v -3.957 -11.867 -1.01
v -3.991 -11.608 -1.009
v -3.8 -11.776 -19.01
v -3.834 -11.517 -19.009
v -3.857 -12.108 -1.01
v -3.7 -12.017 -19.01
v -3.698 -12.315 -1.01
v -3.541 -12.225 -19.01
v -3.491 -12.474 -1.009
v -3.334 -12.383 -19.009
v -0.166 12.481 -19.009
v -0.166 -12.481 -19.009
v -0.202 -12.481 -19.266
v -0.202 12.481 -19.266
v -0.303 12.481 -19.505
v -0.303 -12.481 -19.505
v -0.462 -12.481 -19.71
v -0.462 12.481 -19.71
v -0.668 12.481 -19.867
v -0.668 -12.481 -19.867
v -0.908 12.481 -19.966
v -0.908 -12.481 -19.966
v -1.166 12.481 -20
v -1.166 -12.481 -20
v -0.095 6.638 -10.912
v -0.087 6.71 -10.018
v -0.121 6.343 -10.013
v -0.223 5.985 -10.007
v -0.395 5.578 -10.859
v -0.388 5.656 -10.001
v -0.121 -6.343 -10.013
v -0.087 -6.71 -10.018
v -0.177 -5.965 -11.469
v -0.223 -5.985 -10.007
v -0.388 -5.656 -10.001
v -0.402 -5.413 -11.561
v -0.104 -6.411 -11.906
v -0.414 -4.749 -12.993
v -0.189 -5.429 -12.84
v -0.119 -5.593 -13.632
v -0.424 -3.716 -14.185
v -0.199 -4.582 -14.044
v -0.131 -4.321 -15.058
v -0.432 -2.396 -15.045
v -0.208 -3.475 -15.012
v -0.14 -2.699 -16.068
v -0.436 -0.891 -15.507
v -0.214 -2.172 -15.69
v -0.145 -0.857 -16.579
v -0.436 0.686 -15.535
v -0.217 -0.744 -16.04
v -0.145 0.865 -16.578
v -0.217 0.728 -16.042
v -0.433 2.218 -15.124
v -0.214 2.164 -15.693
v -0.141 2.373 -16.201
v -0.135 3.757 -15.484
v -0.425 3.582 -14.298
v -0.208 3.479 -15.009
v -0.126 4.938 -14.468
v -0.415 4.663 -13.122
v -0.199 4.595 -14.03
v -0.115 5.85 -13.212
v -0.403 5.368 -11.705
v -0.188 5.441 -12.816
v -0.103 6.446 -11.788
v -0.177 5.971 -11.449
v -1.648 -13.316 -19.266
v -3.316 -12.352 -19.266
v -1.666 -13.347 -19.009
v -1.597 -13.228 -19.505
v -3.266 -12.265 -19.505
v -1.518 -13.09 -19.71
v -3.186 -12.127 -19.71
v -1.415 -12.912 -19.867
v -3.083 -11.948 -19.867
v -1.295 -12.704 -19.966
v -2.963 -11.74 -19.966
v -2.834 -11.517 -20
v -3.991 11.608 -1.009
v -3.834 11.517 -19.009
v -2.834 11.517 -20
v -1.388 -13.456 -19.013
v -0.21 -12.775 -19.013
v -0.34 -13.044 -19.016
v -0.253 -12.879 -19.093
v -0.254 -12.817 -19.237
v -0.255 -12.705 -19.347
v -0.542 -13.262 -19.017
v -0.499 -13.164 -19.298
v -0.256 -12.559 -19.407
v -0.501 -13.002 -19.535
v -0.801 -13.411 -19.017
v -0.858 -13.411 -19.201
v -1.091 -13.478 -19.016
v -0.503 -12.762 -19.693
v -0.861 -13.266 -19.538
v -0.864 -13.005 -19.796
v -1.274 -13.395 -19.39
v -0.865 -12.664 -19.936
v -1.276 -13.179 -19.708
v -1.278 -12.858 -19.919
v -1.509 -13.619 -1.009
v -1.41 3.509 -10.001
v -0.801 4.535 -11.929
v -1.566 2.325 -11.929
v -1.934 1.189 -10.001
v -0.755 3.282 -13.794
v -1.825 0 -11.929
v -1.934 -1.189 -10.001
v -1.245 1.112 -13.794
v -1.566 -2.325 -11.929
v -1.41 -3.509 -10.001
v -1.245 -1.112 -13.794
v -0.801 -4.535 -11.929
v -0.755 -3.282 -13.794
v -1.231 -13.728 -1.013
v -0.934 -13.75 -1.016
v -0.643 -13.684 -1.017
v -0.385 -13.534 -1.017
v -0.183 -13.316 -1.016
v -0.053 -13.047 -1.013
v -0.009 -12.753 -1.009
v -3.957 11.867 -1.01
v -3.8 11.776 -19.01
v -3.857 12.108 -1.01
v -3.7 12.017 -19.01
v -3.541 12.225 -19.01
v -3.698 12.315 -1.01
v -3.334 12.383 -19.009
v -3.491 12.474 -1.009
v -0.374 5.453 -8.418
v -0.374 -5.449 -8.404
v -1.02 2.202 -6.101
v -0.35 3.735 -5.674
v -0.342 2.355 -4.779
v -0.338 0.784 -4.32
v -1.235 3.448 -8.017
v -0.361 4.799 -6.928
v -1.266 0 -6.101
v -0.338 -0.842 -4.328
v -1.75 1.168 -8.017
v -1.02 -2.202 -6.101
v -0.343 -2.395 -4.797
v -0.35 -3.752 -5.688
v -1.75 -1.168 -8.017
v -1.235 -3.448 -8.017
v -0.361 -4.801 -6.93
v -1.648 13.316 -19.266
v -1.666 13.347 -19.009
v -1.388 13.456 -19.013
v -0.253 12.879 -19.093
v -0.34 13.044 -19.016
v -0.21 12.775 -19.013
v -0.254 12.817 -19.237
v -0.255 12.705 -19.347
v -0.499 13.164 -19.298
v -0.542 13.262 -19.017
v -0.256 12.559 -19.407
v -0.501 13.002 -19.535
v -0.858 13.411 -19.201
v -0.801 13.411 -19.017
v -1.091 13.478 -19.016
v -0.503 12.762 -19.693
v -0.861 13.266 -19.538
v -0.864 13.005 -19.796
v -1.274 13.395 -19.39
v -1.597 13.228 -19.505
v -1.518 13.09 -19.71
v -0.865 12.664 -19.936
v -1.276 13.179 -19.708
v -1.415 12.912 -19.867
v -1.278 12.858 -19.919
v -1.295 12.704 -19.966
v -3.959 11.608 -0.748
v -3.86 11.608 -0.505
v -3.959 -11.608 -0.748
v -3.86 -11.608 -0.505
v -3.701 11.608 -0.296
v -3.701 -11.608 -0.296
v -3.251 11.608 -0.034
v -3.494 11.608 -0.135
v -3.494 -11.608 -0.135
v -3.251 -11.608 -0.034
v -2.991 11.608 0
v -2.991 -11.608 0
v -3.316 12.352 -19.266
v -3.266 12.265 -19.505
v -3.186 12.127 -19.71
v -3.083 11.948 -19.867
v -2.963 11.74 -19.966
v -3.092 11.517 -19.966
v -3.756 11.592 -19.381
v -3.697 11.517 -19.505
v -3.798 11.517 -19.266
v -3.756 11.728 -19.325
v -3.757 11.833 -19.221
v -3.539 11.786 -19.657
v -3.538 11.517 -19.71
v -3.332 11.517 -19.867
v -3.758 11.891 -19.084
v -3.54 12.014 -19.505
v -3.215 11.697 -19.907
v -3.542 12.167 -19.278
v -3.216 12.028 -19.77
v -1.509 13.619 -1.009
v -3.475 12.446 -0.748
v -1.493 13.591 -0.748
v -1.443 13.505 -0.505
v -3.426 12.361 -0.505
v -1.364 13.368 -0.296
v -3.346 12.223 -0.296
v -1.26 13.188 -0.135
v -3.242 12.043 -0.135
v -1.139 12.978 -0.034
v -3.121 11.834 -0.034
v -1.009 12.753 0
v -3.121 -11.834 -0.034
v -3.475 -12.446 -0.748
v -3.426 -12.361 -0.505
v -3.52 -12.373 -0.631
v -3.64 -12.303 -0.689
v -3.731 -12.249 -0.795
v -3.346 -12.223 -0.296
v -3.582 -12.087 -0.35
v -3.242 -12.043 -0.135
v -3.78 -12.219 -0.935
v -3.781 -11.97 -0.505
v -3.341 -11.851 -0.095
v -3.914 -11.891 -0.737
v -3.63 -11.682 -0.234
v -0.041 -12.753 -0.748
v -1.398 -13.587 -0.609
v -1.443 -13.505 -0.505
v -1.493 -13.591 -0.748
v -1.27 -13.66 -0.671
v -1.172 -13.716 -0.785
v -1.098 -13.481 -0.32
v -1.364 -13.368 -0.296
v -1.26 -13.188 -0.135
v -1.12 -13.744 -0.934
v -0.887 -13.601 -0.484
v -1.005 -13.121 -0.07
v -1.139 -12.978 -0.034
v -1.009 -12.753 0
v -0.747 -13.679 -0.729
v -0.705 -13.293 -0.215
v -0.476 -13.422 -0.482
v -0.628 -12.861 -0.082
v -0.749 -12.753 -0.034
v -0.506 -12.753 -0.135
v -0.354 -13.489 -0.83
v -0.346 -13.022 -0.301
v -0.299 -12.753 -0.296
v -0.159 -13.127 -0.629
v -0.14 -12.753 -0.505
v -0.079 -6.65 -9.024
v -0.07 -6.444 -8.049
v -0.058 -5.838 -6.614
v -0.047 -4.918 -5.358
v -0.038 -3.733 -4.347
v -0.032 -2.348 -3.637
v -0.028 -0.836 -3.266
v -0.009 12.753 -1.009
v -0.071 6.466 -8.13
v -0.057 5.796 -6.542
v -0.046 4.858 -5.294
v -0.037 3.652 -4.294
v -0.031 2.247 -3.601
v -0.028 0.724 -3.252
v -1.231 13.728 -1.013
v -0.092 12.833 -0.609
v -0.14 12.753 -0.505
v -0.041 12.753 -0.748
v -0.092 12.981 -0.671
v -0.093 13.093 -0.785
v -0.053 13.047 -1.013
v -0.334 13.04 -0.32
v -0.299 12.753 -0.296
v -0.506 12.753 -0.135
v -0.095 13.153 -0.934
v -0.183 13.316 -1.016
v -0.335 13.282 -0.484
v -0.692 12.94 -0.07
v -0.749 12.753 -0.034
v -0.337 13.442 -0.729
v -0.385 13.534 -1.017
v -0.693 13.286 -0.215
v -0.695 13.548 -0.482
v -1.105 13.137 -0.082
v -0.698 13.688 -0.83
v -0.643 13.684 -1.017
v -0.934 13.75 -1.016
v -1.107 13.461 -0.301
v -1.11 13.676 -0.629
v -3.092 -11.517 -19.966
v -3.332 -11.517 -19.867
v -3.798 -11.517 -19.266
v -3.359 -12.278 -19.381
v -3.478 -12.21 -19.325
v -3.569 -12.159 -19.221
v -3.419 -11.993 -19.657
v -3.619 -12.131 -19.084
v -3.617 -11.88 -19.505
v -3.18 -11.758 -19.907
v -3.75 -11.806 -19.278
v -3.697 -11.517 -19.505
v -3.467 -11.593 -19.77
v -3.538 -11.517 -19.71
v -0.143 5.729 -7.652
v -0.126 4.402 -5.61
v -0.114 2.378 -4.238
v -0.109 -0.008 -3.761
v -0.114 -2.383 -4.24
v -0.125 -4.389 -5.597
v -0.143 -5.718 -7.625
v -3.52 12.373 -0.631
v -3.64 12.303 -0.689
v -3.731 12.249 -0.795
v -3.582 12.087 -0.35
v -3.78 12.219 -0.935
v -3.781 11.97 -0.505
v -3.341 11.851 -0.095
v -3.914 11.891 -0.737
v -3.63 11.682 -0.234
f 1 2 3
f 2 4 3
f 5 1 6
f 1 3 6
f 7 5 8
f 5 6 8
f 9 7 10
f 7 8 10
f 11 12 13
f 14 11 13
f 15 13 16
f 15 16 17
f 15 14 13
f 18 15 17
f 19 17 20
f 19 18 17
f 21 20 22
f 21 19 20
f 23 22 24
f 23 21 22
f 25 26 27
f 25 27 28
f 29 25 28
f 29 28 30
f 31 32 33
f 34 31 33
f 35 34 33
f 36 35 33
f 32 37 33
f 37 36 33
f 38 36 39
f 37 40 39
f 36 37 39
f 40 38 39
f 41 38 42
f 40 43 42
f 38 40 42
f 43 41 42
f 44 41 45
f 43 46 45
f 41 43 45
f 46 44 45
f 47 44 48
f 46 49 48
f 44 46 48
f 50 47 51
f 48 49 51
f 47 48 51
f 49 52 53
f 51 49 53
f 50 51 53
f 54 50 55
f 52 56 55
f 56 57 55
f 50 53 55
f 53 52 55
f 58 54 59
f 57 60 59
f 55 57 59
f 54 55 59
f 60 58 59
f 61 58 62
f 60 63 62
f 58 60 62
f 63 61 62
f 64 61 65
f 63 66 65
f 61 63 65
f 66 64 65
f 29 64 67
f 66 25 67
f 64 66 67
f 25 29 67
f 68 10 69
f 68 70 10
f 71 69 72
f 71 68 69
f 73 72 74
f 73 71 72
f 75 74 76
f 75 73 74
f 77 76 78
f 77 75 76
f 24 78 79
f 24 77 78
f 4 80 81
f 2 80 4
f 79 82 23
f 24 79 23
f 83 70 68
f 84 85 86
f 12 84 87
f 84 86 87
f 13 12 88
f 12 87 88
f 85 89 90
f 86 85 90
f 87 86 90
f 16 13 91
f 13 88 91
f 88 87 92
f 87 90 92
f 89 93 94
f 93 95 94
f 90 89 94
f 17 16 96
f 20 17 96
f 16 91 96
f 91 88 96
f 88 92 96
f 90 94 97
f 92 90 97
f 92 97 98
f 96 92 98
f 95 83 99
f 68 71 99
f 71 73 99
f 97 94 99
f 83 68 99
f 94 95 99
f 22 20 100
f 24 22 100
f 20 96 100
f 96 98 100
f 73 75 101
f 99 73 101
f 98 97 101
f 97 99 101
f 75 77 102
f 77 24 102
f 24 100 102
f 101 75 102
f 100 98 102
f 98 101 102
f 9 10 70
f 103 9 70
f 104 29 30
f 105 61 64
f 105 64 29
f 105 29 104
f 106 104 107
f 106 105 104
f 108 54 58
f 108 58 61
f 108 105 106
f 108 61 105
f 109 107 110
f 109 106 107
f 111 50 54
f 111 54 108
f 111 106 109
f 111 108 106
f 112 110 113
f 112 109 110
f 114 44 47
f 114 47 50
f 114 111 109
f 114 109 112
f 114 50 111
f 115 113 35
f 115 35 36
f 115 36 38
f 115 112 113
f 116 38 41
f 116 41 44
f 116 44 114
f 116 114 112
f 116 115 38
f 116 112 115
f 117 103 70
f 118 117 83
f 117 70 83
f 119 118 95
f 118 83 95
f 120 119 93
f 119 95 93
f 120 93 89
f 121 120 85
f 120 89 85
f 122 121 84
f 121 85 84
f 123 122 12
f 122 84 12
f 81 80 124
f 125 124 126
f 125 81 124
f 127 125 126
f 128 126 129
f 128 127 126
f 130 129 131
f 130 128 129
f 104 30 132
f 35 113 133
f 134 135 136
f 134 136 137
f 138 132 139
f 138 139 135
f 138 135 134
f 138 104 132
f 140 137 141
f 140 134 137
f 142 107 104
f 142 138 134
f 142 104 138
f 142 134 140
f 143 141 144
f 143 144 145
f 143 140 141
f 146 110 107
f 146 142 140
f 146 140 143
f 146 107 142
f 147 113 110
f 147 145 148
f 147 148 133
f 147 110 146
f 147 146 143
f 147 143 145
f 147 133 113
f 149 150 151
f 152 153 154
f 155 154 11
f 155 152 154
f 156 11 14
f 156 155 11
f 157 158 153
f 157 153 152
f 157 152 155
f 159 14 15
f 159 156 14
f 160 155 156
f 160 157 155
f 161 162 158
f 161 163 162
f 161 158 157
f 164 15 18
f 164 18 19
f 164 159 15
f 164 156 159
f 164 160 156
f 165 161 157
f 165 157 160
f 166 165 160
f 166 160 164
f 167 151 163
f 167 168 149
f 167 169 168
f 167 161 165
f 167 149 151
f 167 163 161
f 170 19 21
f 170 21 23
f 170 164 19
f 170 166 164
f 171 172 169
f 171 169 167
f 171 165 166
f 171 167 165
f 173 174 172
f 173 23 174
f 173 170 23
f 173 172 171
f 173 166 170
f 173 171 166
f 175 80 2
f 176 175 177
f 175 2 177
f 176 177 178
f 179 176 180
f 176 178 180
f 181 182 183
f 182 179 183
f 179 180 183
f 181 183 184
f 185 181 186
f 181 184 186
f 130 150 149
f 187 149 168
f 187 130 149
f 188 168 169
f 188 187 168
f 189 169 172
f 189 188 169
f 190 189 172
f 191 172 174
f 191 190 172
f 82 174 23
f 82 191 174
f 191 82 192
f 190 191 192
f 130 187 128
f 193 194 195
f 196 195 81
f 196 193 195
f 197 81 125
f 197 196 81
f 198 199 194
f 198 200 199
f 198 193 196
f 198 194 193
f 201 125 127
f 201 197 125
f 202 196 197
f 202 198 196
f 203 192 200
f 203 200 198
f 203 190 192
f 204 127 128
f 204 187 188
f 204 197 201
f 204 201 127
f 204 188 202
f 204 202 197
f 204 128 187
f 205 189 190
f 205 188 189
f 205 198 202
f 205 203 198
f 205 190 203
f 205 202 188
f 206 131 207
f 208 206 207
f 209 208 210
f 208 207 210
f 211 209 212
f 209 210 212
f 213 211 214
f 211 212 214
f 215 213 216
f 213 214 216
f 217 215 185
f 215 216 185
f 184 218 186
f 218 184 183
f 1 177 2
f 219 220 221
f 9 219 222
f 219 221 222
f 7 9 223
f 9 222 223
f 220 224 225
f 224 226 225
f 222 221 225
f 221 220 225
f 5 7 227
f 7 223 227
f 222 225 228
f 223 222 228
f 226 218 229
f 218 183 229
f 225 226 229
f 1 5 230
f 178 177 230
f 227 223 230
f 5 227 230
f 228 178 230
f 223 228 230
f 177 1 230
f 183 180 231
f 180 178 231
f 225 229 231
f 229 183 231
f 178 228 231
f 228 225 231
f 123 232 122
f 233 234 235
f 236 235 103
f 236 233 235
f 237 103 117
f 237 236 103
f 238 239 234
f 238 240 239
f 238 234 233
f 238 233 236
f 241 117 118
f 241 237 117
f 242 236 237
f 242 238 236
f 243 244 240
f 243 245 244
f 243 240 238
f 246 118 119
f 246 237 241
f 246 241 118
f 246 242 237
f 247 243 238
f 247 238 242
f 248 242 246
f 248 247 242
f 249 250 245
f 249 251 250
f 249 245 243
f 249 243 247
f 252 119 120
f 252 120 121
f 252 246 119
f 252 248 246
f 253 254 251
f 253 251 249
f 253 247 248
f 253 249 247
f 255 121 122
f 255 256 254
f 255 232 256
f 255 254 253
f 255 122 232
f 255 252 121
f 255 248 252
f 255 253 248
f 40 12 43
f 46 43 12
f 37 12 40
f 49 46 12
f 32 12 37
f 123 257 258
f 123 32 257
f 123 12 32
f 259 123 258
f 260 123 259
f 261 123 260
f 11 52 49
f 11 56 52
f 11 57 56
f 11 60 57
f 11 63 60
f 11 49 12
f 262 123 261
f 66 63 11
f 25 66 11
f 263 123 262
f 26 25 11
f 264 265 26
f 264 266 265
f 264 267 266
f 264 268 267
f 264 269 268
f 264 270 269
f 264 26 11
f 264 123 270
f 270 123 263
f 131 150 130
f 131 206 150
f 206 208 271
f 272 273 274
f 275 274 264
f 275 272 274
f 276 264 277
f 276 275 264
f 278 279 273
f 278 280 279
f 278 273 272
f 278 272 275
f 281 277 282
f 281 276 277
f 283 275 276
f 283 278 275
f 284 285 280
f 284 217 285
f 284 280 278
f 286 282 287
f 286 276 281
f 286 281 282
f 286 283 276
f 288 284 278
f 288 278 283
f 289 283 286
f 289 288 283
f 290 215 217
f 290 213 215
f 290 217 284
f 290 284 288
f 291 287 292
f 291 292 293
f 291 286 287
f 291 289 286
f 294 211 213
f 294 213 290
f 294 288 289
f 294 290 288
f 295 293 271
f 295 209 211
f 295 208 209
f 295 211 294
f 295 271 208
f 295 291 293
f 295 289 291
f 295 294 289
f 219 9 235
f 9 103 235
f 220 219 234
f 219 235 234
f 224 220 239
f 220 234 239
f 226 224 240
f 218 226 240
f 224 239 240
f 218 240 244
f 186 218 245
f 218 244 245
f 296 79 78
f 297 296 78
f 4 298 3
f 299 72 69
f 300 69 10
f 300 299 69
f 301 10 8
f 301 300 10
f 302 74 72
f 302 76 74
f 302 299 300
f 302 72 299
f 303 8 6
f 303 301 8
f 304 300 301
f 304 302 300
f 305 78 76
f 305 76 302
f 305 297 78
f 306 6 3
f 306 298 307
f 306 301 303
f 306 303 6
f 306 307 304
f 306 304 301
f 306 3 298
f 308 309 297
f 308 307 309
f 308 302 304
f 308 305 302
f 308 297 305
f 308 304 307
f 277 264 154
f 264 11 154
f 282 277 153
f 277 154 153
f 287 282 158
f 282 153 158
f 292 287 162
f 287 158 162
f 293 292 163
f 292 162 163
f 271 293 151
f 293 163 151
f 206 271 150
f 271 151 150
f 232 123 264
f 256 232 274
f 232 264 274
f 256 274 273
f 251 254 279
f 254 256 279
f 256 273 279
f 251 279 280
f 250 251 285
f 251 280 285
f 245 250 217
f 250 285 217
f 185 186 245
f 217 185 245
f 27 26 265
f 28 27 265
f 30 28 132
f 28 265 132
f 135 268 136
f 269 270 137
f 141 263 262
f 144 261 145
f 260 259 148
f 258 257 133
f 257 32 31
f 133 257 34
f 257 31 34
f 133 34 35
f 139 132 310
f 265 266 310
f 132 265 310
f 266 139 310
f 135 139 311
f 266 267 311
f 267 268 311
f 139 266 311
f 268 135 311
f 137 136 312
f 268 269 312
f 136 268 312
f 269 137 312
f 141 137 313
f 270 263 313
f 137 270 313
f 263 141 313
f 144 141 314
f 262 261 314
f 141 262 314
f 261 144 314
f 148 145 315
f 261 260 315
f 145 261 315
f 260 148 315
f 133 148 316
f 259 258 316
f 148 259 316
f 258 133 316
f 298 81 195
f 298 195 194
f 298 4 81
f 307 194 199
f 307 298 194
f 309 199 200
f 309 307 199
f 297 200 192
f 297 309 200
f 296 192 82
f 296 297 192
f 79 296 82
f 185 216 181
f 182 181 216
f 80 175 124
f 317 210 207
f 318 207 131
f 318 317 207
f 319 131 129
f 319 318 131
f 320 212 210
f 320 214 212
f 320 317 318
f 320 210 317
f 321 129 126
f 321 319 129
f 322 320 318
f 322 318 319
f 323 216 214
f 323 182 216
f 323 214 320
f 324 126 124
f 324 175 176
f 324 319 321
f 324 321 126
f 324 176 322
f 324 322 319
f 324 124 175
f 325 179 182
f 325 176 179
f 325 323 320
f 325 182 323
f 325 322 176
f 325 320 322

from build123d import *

# Parameters (mm, degrees)
BOSS_EXTRUDE1_DEPTH = 20
BOSS_EXTRUDE1_DRAFT = -0.5
FILLET1_R           = 1
FILLET2_R           = 2


with BuildPart() as part:
    # Sketch1 → Boss-Extrude1 (with draft: the straight prism first)
    with BuildSketch(Plane.XY):
        Polygon((-4, 12.190598923), (-4, -12.190598923), (0, -14.5), (0, 14.5), align=None)
    extrude(amount=-BOSS_EXTRUDE1_DEPTH)
    # Boss-Extrude1: the draft: its side faces are tilted about the plane it starts from
    boss_extrude1_sides = [part.faces().sort_by_distance(p)[0] for p in [
        (-4, 0, -10),
        (-2, -13.345299462, -10),
        (0, 0, -10),
        (-2, 13.345299462, -10),
    ]]
    draft(boss_extrude1_sides, Plane.XY, BOSS_EXTRUDE1_DRAFT)

    # Fillet1
    fillet1_edges = [part.edges().sort_by_distance(p)[0] for p in [
        (-2, 13.143761083, -20),
        (-3.825462644, 0, -20),
        (-2, -13.143761083, -20),
        (-4, 0, 0),
        (-2, 13.345299462, 0),
        (0, 0, 0),
        (-2, -13.345299462, 0),
        (-3.912731322, -12.140214329, -10),
        (-3.912731322, 12.140214329, -10),
        (-0.087268678, 14.348846216, -10),
        (-0.087268678, -14.348846216, -10),
        (-0.174537356, 0, -20),
    ]]
    fillet(fillet1_edges, radius=FILLET1_R)

    # Sketch2 → Cut-Revolve1 (revolve, cut)
    with BuildSketch(Plane(origin=(0, 0, 0), x_dir=(1, 0, 0), z_dir=(0, 1, 0))):
        with BuildLine():
            Line((8.726833455, 10.000724303), (8.726833455, -0.726109151))
            ThreePointArc((8.726833455, -0.726109151), (16.311850131, 2.415707627), (19.453666909, 10.000724303))
            ThreePointArc((19.453666909, 10.000724303), (16.311850131, 17.58574098), (8.726833455, 20.727557758))
            Line((8.726833455, 20.727557758), (8.726833455, 10.000724303))
        make_face()
    revolve(axis=Axis((8.726833455, 0, -20.727557758), (0, 0, 1)), mode=Mode.SUBTRACT)

    # Fillet2
    fillet2_edges = [part.edges().sort_by_distance(p)[0] for p in [
        (-0.139958798, 0, -16.037689693),
    ]]
    fillet(fillet2_edges, radius=FILLET2_R)


solid = part.part
